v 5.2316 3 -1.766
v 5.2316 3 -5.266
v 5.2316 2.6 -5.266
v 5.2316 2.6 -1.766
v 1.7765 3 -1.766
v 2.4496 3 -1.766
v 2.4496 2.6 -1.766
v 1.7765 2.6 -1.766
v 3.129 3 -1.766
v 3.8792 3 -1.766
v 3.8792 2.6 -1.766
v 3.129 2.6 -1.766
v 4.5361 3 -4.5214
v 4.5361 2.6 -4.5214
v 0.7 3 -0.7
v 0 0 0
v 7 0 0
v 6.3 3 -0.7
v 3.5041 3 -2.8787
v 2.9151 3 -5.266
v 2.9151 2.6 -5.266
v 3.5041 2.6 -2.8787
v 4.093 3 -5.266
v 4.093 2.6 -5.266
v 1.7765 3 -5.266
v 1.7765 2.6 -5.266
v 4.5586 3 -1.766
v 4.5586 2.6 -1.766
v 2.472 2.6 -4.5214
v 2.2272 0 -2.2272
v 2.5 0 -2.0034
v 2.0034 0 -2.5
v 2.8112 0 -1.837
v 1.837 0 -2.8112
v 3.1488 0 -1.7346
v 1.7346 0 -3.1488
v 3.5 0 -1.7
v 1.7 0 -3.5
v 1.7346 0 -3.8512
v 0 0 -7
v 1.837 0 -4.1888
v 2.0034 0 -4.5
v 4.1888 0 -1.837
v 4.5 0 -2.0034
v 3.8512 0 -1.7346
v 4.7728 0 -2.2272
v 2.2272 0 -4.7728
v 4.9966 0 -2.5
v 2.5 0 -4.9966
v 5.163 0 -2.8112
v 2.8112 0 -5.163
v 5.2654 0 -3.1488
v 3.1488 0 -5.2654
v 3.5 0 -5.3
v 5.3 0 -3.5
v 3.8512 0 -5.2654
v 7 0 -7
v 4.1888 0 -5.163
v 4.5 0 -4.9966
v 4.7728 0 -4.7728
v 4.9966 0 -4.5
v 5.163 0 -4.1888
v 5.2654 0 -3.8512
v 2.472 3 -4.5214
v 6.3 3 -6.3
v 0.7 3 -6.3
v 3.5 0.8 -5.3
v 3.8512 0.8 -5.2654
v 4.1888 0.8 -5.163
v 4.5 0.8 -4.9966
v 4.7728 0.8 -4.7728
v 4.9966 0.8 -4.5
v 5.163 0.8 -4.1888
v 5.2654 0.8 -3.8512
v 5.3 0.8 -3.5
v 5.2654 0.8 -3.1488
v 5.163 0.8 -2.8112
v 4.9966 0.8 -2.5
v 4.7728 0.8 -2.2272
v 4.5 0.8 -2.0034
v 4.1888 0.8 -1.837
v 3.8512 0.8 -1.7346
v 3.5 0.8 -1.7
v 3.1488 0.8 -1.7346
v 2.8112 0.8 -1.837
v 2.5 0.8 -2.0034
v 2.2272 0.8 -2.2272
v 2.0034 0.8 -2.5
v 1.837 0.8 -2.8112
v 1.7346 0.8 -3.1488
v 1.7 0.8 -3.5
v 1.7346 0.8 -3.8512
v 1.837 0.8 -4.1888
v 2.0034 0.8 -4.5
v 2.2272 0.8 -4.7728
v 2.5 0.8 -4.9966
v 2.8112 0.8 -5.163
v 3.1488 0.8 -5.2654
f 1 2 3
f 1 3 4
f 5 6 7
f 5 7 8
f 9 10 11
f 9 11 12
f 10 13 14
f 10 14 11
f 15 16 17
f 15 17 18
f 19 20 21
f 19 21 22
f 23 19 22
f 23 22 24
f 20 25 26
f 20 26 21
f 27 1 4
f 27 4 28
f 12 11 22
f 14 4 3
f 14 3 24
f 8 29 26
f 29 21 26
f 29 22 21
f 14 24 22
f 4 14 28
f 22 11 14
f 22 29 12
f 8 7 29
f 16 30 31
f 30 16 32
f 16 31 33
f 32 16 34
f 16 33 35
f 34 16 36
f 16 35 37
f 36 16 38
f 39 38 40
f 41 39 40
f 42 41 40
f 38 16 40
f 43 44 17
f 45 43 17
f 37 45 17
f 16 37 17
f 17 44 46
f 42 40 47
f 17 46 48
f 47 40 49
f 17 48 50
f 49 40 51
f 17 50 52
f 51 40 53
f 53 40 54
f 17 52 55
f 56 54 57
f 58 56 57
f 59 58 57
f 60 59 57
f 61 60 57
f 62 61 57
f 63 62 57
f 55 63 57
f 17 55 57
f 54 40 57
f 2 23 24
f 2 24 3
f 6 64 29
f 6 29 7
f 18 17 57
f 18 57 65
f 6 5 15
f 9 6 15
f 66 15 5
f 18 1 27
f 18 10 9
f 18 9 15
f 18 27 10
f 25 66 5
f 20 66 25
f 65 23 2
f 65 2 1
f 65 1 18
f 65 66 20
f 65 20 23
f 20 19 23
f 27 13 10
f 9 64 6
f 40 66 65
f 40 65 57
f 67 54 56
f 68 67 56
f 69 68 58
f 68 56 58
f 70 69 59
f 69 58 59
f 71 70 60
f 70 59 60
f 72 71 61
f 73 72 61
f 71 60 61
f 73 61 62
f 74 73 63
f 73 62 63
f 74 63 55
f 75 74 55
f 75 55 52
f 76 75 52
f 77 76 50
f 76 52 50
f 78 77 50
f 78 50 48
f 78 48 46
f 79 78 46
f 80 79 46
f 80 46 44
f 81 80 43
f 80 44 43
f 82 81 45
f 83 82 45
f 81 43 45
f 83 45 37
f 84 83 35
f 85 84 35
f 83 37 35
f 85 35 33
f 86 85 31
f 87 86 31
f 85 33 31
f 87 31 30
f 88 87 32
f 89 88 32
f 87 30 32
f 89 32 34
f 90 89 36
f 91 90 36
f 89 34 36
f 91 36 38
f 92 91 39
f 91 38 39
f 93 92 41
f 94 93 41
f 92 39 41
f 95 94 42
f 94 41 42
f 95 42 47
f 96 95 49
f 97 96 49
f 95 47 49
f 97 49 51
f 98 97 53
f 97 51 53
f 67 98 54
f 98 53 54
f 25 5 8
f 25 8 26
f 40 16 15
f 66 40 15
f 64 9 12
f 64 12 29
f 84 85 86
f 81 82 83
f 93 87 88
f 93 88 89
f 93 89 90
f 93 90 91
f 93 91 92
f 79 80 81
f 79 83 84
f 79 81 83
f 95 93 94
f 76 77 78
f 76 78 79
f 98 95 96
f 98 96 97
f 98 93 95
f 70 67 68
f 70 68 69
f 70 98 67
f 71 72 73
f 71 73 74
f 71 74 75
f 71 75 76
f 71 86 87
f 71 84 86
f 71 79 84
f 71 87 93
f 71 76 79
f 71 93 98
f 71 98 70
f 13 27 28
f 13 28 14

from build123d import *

# Parameters (mm, degrees)
SKETCH1_W           = 7
SKETCH1_H           = 7
BOSS_EXTRUDE1_DEPTH = 3
CUT_EXTRUDE1_DEPTH  = 7
CUT_EXTRUDE2_DEPTH  = 11
SKETCH4_R           = 1.8
CUT_EXTRUDE3_DEPTH  = 0.8
CUT_EXTRUDE4_DEPTH  = 0.4


with BuildPart() as part:
    # Sketch1 → Boss-Extrude1 (new body)
    with BuildSketch(Plane(origin=(0, 0, 0), x_dir=(1, 0, 0), z_dir=(0, 1, 0))):
        with Locations((3.5, 3.5)):
            Rectangle(SKETCH1_W, SKETCH1_H)
    extrude(amount=BOSS_EXTRUDE1_DEPTH)

    # Sketch2 → Cut-Extrude1 (cut)
    with BuildSketch(Plane.XY):
        Polygon((0, 0), (0.7, 3), (0, 3), align=None)
        Polygon((7, 0), (6.3, 3), (7, 3), align=None)
    extrude(amount=-CUT_EXTRUDE1_DEPTH, mode=Mode.SUBTRACT)

    # Sketch3 → Cut-Extrude2 (cut)
    with BuildSketch(Plane(origin=(0, 0, 0), x_dir=(0, 0, -1), z_dir=(1, 0, 0))):
        Polygon((0, 0), (0.7, 3), (0, 3), align=None)
        Polygon((7, 3), (6.3, 3), (7, 0), align=None)
    extrude(amount=CUT_EXTRUDE2_DEPTH, mode=Mode.SUBTRACT)

    # Sketch4 → Cut-Extrude3 (cut)
    with BuildSketch(Plane.XZ):
        with Locations(Location((3.5, -3.5, 0), (0, 0, 270))):
            Circle(SKETCH4_R)
    extrude(amount=-CUT_EXTRUDE3_DEPTH, mode=Mode.SUBTRACT)

    # Sketch5 → Cut-Extrude4 (cut)
    with BuildSketch(Plane(origin=(0, 3, 0), x_dir=(1, 0, 0), z_dir=(0, 1, 0))):
        Polygon((1.77651834, 1.766029319), (1.77651834, 5.266029319), (2.915140135, 5.266029319), (3.504082443, 2.878709608), (4.09302475, 5.266029319), (5.231646545, 5.266029319), (5.231646545, 1.766029319), (4.558569622, 1.766029319), (4.536133725, 4.521437973), (3.879182603, 1.766029319), (3.128982282, 1.766029319), (2.47203116, 4.521437973), (2.449595263, 1.766029319), align=None)
    extrude(amount=-CUT_EXTRUDE4_DEPTH, mode=Mode.SUBTRACT)


solid = part.part
